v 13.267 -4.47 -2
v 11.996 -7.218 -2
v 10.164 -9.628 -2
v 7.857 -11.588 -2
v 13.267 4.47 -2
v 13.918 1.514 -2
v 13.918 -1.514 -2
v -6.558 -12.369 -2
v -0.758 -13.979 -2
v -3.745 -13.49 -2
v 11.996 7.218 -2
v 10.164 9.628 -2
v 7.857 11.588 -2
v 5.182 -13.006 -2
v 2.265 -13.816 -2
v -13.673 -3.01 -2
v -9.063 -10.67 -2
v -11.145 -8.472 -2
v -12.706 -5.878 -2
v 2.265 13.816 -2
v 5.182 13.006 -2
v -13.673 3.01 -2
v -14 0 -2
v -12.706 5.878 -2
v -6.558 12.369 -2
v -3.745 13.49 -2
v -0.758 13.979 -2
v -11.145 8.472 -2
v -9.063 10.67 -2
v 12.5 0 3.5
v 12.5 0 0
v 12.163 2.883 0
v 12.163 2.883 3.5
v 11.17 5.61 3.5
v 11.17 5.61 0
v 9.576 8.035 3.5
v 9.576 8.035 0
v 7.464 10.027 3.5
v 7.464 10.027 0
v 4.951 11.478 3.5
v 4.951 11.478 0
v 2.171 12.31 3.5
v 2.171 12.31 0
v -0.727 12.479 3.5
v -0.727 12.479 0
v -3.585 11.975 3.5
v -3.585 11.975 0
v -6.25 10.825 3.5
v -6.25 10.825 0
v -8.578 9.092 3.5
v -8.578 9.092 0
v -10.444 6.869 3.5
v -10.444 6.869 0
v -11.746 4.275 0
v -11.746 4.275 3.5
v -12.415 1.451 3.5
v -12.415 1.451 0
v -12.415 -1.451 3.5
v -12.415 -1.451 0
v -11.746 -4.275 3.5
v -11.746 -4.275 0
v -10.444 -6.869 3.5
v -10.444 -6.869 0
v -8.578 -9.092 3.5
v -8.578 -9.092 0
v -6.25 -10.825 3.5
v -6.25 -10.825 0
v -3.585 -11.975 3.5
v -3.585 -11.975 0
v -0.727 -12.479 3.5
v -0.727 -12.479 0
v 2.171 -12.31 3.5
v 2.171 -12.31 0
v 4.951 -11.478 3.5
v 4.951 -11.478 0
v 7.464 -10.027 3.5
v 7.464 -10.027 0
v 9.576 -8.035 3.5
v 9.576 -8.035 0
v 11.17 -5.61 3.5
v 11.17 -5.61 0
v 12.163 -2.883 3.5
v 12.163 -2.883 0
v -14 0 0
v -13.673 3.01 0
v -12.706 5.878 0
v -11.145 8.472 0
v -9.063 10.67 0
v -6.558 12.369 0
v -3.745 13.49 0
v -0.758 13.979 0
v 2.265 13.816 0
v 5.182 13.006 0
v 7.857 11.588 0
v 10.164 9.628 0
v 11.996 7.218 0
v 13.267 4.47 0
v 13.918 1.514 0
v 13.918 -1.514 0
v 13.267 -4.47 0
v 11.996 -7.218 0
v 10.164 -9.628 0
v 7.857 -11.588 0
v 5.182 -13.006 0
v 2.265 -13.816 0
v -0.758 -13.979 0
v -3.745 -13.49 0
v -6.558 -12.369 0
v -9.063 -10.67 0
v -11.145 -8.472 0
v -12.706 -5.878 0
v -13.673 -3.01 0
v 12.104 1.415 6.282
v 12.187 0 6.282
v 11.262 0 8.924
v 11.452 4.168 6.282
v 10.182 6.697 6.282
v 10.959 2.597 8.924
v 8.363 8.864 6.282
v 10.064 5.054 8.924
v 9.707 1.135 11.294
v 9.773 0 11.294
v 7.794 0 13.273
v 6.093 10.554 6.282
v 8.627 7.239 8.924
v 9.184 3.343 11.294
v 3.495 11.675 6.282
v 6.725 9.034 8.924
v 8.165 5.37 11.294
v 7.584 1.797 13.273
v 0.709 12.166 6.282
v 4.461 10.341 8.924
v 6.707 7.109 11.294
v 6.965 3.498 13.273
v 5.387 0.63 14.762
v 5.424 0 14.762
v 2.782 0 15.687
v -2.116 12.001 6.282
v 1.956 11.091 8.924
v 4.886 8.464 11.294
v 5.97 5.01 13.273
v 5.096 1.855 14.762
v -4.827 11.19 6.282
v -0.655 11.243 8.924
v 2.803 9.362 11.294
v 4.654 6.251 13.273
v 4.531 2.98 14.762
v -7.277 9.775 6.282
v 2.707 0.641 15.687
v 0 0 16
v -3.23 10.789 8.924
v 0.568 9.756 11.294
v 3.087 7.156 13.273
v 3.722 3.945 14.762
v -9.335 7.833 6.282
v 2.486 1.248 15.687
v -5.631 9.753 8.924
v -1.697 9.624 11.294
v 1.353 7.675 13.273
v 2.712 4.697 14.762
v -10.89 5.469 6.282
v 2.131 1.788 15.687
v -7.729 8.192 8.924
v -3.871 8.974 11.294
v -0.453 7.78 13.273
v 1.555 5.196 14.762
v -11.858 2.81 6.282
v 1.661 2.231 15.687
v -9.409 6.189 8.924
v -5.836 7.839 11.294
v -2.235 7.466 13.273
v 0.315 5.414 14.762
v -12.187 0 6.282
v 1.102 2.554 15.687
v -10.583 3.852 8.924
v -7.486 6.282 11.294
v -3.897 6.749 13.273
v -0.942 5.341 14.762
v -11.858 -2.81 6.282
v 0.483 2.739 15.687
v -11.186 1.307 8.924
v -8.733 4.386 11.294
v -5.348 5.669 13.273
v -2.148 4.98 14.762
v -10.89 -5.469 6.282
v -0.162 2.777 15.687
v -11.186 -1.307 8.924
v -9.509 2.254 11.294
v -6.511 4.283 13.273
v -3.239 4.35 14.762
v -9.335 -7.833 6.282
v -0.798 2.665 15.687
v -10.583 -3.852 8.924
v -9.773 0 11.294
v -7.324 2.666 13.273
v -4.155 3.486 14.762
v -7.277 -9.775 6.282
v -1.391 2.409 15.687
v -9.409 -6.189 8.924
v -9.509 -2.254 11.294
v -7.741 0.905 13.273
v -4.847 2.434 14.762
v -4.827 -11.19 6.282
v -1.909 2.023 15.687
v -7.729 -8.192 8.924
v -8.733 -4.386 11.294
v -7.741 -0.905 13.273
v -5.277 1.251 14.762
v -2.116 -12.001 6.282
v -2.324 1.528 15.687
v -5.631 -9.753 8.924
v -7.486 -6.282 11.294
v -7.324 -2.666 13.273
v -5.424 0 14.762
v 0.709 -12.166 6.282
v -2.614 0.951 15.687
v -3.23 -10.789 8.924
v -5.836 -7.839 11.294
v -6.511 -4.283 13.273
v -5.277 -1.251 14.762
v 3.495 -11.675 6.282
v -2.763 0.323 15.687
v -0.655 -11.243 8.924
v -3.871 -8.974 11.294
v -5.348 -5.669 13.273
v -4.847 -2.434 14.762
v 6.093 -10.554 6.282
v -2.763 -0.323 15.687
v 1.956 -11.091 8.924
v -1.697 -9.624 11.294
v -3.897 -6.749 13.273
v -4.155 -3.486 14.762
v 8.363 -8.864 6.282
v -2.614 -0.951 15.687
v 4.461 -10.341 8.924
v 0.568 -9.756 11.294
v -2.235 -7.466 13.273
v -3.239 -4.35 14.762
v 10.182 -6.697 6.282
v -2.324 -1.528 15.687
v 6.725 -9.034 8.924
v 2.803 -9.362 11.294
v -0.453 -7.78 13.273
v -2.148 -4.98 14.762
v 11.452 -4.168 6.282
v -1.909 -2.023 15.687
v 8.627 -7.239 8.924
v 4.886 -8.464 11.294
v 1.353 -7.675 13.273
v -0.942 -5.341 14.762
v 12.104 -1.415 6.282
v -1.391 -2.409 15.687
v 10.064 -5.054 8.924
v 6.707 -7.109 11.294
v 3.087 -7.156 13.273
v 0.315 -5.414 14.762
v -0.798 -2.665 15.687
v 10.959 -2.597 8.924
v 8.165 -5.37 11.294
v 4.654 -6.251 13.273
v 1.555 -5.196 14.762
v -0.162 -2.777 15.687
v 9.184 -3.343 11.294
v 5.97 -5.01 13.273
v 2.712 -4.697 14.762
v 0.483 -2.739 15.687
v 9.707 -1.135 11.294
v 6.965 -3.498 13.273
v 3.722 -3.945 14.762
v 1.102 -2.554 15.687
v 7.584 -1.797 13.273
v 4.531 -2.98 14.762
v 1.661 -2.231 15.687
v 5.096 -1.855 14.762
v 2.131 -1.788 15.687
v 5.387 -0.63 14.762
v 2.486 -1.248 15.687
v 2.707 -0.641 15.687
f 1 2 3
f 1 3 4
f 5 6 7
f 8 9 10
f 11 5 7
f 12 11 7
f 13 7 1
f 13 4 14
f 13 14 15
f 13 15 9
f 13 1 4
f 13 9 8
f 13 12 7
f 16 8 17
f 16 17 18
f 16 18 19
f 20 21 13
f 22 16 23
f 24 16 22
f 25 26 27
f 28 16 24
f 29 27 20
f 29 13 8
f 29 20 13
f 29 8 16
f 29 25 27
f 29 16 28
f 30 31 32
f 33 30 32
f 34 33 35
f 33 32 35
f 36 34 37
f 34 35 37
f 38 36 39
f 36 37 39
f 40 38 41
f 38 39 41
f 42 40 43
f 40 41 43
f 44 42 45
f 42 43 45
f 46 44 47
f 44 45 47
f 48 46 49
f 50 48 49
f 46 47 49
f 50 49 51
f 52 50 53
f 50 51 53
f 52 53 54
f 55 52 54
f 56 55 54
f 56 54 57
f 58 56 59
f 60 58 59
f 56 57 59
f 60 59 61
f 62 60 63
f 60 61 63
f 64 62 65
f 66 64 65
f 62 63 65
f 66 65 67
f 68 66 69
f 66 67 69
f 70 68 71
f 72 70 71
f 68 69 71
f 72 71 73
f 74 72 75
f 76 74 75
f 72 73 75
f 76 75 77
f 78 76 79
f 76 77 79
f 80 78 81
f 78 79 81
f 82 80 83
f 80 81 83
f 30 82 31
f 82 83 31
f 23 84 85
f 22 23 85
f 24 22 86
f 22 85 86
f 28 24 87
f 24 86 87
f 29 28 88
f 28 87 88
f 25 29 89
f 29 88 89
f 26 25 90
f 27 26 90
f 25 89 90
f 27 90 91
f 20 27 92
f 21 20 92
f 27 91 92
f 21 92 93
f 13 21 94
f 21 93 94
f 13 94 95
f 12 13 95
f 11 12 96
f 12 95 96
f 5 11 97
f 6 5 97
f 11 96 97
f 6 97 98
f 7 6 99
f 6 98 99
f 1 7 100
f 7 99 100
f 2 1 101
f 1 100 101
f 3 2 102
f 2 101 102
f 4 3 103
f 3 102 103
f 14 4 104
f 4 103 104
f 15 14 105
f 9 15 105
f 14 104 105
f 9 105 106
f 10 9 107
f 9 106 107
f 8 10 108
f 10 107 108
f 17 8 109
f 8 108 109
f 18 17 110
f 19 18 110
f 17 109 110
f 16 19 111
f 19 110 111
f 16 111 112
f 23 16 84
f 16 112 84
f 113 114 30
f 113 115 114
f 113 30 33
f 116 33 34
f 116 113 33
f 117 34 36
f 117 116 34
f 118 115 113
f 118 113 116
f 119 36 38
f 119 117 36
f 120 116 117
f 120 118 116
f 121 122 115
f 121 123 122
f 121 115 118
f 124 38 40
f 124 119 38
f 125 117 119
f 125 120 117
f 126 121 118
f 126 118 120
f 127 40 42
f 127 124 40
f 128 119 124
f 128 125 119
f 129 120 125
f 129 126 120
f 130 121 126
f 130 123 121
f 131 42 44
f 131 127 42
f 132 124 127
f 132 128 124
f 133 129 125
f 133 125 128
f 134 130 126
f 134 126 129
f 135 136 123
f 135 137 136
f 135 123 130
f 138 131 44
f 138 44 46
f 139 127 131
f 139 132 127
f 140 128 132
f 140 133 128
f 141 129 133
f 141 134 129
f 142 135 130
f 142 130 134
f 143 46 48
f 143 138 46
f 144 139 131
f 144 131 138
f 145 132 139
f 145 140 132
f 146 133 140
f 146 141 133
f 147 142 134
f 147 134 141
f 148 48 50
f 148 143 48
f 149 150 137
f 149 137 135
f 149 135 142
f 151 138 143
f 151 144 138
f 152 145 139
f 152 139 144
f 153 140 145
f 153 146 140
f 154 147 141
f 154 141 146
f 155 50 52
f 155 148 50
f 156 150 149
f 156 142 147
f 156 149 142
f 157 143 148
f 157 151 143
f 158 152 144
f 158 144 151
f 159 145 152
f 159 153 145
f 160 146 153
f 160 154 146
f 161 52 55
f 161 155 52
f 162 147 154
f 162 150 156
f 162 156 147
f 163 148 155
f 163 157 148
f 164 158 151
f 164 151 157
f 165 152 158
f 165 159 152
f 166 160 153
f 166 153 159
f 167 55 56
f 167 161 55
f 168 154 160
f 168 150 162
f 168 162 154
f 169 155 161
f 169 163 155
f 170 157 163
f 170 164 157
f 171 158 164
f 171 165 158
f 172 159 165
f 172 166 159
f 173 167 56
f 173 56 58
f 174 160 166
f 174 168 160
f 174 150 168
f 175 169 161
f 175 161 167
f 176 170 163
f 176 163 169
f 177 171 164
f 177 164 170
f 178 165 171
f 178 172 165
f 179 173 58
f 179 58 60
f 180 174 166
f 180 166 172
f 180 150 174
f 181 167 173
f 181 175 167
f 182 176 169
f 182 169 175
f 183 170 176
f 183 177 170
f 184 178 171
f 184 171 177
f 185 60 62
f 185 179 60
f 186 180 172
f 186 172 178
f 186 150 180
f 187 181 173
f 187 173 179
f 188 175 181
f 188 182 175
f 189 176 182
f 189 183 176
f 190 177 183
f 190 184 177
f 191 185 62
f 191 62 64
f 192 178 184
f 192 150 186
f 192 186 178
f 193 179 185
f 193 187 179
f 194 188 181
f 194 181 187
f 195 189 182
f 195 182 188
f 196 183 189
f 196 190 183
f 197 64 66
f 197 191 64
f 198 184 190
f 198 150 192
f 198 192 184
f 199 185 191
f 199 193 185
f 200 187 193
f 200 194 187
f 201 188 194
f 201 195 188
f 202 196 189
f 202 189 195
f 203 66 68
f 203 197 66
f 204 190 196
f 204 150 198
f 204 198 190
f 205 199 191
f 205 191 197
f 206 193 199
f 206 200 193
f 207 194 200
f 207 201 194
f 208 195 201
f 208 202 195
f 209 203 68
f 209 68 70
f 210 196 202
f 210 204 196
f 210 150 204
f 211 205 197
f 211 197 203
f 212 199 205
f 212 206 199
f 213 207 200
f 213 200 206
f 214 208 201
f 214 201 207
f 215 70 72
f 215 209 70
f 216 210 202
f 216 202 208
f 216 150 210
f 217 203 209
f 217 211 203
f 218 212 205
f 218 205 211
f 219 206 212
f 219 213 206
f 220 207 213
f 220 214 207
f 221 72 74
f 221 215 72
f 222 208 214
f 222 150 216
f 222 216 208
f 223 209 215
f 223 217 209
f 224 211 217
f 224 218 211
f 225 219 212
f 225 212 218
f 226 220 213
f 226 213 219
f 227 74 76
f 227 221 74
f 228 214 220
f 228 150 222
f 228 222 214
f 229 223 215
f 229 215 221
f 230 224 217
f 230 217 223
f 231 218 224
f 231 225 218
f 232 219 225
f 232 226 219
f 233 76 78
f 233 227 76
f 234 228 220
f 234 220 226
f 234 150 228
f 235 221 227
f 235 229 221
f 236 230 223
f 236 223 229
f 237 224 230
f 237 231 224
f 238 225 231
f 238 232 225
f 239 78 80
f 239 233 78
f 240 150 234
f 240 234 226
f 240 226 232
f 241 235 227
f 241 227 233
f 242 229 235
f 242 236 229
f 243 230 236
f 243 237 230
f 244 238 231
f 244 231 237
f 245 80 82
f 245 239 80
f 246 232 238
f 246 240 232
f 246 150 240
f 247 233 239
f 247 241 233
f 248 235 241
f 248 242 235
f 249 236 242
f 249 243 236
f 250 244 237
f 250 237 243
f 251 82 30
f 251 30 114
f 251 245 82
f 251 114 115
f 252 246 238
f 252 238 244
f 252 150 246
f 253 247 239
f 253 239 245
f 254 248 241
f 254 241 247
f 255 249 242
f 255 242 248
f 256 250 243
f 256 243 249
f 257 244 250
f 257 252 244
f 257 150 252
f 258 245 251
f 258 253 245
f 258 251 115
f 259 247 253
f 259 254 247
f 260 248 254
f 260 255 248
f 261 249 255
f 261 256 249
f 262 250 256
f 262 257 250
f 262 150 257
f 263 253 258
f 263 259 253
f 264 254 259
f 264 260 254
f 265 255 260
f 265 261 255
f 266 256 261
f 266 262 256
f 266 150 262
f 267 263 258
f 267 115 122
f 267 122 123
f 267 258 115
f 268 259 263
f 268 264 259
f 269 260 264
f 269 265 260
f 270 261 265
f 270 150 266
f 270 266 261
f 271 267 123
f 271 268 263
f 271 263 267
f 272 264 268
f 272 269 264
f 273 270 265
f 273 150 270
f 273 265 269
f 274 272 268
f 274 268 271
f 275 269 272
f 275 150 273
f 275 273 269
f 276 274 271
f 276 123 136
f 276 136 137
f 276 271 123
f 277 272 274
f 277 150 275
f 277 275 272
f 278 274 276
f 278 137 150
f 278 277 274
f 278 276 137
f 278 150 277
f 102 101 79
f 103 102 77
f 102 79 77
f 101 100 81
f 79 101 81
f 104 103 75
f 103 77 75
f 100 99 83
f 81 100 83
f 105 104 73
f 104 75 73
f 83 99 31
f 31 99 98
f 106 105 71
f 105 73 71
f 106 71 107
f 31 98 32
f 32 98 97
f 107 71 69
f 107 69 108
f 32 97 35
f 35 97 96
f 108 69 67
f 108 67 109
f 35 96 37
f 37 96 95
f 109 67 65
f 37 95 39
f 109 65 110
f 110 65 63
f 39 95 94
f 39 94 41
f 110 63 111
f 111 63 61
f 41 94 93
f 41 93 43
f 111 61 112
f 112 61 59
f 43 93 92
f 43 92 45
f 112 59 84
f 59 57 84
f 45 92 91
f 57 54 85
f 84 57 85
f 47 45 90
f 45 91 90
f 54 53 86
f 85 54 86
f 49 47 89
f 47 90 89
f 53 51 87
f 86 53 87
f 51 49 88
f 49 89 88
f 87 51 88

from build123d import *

# Parameters (mm, degrees)
SKETCH1_R           = 12.5
BOSS_EXTRUDE1_DEPTH = 16
FILLET1_R           = 12.5
SKETCH2_R           = 14
BOSS_EXTRUDE2_DEPTH = 2


with BuildPart() as part:
    # Sketch1 → Boss-Extrude1 (new body)
    with BuildSketch(Plane.XY):
        Circle(SKETCH1_R)
    extrude(amount=BOSS_EXTRUDE1_DEPTH)

    # Fillet1
    fillet1_edges = [part.edges().sort_by_distance(p)[0] for p in [
        (-12.5, 0, 16),
    ]]
    fillet(fillet1_edges, radius=FILLET1_R)

    # Sketch2 → Boss-Extrude2 (add)
    with BuildSketch(Plane(origin=(0, 0, 0), x_dir=(-1, 0, 0), z_dir=(0, 0, -1))):
        Circle(SKETCH2_R)
    extrude(amount=BOSS_EXTRUDE2_DEPTH)


solid = part.part
